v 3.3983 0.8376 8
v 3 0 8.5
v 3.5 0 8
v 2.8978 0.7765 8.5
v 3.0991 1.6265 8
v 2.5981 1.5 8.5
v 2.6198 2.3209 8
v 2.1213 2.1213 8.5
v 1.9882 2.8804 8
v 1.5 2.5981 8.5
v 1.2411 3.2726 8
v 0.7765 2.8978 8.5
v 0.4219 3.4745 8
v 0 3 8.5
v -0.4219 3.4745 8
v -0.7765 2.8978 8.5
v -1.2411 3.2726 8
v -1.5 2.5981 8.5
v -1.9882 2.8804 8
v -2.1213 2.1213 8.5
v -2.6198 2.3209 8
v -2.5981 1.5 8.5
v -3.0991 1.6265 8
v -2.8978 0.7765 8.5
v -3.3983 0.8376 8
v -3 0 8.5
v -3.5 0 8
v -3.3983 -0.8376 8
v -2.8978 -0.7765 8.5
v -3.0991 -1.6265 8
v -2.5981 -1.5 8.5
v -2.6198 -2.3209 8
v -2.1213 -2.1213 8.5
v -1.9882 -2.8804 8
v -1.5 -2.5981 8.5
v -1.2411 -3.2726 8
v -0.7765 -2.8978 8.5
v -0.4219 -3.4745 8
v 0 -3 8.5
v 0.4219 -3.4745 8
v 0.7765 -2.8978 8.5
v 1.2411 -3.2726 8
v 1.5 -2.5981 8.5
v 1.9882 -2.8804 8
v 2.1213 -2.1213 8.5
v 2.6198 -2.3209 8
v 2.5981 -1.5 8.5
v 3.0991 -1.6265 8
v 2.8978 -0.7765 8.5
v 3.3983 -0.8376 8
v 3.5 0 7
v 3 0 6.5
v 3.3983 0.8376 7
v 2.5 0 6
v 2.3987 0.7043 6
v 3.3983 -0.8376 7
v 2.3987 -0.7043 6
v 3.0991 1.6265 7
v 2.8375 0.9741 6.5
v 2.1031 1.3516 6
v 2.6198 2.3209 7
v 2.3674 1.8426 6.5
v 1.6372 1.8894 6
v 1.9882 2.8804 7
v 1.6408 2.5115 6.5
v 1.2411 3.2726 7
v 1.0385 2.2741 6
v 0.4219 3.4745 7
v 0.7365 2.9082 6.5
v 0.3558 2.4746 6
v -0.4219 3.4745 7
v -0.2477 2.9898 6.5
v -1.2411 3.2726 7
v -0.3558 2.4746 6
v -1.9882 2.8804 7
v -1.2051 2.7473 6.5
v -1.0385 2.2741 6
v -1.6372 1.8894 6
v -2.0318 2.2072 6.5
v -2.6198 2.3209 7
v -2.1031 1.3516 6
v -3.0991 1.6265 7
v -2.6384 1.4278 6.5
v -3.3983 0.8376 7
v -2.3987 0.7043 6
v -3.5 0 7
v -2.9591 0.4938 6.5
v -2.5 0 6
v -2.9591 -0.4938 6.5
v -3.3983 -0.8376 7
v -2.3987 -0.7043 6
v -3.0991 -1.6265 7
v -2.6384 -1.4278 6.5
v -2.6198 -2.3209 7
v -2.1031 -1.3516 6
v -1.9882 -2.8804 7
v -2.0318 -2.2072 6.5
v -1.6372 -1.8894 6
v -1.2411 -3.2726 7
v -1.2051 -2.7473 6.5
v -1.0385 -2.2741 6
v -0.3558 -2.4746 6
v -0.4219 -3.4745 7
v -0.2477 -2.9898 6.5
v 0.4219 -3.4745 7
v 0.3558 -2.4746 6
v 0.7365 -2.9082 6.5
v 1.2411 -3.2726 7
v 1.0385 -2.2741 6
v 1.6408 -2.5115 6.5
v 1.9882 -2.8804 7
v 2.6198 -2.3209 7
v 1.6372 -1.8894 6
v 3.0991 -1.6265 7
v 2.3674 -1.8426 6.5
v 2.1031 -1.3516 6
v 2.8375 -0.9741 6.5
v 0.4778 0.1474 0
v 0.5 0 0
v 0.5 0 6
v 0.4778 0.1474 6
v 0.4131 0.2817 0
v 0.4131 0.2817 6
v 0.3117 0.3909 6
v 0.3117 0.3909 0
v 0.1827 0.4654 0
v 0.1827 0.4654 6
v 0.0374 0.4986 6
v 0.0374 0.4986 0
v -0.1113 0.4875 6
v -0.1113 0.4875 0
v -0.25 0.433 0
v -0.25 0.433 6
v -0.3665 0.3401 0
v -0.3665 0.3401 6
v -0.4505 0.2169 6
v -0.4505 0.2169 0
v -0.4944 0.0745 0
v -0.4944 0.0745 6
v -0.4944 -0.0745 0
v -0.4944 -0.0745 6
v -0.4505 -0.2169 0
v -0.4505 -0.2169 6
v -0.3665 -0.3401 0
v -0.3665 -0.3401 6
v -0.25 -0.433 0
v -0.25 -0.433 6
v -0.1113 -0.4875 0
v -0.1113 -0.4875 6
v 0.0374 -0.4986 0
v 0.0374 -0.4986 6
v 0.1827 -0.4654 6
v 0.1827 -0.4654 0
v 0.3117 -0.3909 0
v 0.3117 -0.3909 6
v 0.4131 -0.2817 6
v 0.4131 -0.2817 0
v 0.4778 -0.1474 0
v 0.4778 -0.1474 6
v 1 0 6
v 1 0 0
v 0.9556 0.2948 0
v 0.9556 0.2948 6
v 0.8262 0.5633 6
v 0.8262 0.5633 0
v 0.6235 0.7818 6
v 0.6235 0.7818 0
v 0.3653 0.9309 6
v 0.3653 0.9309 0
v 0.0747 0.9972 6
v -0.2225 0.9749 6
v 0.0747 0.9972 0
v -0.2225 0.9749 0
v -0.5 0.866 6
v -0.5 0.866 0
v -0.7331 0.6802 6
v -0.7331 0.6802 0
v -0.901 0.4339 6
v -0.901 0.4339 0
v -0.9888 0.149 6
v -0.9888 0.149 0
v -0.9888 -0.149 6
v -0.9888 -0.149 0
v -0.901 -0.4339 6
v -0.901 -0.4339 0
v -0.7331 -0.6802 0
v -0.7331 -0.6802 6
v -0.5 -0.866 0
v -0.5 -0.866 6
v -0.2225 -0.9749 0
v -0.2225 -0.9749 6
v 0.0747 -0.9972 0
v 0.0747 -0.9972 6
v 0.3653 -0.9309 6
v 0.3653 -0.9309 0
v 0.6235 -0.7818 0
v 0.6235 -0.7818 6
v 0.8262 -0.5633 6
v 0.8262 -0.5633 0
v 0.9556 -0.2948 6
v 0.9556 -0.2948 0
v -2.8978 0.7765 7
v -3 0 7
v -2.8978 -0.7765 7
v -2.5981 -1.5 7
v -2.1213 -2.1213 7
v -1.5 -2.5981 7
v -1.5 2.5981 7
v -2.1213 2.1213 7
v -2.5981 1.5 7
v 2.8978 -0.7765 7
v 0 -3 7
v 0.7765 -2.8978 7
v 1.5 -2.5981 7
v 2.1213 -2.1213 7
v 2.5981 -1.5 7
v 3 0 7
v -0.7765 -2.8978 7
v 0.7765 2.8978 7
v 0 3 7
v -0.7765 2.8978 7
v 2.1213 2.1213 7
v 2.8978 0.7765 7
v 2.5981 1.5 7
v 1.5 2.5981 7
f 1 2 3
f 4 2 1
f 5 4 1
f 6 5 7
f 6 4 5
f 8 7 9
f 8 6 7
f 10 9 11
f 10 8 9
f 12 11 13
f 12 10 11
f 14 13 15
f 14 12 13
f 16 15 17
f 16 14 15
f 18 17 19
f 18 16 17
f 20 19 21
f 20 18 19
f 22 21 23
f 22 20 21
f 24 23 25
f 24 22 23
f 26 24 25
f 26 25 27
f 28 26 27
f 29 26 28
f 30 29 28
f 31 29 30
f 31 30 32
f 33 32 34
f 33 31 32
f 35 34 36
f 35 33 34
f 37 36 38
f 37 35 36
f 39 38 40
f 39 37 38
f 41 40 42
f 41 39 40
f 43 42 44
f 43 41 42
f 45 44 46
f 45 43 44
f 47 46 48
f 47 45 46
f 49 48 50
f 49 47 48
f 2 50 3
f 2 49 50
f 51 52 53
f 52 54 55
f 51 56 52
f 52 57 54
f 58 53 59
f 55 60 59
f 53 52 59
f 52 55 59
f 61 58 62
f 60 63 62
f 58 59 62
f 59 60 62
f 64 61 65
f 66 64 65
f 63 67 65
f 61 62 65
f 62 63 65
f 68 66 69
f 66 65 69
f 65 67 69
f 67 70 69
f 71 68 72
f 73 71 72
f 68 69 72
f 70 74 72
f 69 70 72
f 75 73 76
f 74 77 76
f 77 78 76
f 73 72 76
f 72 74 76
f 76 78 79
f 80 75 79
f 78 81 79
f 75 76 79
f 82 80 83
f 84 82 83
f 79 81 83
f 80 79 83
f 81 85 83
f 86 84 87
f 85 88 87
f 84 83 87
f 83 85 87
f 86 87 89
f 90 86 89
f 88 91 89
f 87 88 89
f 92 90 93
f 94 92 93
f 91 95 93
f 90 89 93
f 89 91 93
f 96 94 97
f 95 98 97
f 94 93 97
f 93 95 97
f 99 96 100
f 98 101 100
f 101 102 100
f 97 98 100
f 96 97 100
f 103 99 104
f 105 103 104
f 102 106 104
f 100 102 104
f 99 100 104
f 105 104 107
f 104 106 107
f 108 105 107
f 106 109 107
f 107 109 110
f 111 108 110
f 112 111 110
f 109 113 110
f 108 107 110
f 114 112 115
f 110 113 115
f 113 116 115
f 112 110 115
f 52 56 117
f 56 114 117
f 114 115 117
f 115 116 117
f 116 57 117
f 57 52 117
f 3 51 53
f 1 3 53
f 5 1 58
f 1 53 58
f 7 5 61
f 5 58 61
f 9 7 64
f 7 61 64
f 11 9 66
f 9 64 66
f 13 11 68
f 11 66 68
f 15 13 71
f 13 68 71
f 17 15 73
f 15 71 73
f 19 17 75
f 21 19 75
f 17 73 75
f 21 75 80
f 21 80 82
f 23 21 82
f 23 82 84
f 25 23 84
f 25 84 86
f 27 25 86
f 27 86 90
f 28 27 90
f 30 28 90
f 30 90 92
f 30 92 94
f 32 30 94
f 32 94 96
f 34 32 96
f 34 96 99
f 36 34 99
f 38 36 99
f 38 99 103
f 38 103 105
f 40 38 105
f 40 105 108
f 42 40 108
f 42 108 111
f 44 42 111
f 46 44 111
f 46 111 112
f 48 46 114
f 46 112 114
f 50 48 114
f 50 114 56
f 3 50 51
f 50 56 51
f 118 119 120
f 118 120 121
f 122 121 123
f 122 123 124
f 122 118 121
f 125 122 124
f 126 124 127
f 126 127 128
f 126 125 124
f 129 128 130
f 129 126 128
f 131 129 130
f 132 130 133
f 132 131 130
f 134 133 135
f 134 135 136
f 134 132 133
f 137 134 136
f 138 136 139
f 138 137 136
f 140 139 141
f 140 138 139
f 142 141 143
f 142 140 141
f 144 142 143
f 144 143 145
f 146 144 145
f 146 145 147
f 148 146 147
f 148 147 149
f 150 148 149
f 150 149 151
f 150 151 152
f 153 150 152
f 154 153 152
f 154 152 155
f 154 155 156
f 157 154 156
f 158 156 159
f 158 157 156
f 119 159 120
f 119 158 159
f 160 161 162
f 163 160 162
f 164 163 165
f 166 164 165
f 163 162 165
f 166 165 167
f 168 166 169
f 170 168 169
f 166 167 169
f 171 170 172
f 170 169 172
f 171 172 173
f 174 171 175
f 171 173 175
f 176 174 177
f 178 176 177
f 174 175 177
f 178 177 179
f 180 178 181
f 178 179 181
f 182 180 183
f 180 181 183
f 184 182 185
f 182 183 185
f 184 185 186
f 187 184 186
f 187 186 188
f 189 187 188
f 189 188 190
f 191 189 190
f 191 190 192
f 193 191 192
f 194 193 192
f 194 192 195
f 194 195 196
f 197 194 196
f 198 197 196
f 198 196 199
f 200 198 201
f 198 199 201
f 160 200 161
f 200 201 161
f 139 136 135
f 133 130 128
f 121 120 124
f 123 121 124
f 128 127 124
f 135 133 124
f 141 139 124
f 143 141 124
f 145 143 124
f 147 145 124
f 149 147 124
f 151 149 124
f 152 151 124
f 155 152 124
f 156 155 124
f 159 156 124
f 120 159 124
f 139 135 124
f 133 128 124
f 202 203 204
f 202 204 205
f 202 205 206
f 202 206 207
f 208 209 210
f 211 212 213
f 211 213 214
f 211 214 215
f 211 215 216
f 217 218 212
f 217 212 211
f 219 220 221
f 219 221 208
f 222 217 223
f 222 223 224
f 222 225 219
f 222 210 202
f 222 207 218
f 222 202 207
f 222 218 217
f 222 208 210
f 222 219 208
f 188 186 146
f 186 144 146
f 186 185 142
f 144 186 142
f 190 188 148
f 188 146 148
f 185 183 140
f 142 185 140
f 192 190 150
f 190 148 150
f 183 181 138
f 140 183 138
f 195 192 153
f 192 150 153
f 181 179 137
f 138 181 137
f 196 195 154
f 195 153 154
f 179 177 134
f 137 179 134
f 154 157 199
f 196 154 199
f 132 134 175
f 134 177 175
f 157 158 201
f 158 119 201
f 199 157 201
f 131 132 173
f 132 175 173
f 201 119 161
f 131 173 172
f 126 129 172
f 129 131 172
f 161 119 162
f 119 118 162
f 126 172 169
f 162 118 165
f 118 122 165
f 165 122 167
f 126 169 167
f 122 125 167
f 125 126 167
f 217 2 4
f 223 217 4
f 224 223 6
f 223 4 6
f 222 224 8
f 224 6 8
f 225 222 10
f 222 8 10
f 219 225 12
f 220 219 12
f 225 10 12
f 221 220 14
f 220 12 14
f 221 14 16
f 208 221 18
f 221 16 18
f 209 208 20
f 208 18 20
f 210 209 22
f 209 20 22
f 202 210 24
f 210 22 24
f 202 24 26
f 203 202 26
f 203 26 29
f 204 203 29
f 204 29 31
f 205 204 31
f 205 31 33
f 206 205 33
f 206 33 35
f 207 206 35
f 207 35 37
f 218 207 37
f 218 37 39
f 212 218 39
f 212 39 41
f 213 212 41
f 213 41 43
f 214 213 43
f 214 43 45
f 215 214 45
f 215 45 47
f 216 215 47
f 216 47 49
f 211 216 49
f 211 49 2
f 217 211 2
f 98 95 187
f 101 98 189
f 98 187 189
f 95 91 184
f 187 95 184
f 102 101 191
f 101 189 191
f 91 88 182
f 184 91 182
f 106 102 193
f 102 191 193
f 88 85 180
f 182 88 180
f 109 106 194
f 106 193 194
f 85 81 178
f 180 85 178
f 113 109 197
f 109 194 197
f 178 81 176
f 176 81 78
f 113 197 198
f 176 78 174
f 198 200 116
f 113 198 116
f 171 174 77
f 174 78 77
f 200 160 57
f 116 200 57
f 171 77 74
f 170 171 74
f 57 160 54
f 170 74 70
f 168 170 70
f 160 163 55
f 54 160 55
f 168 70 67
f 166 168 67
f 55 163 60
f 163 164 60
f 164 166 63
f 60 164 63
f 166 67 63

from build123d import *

# Parameters (mm, degrees)
ESBO_O1_R                = 1
ESBO_O1_R_2              = 0.5
RESSALTO_EXTRUS_O1_DEPTH = 6
ESBO_O3_R                = 3.5
RESSALTO_EXTRUS_O2_DEPTH = 3
ESBO_O4_R                = 3
CORTE_EXTRUS_O1_DEPTH    = 2
CHANFRO1_SIZE            = 1


with BuildPart() as part:
    # Esboço1 → Ressalto-extrusão1 (new body)
    with BuildSketch(Plane.XY):
        Circle(ESBO_O1_R)
        Circle(ESBO_O1_R_2, mode=Mode.SUBTRACT)
    extrude(amount=RESSALTO_EXTRUS_O1_DEPTH)

    # Esboço3 → Ressalto-extrusão2 (add)
    with BuildSketch(Plane.XY.offset(6)):
        Circle(ESBO_O3_R)
    extrude(amount=RESSALTO_EXTRUS_O2_DEPTH)

    # Esboço4 → Corte-extrusão1 (cut)
    with BuildSketch(Plane.XY.offset(9)):
        Circle(ESBO_O4_R)
    extrude(amount=-CORTE_EXTRUS_O1_DEPTH, mode=Mode.SUBTRACT)

    # Chanfro1
    # the kernel refuses this chamfer: 1 mm, written as the material it takes off along each edge
    with BuildSketch(Plane(origin=(0, 0, 9), x_dir=(1, 0, 0), z_dir=(0, -1, 0))) as chanfro1_piece_1:
        Polygon((3.5, -CHANFRO1_SIZE), (3.5 - CHANFRO1_SIZE, 0), (3.5, 0), align=None)
    revolve(axis=Axis((0, 0, 9), (0, 0, 1)), mode=Mode.SUBTRACT)
    with BuildSketch(Plane(origin=(0, 0, 6), x_dir=(1, 0, 0), z_dir=(0, -1, 0))) as chanfro1_piece_2:
        Polygon((3.5, CHANFRO1_SIZE), (3.5 - CHANFRO1_SIZE, 0), (3.5, 0), align=None)
    revolve(axis=Axis((0, 0, 6), (0, 0, 1)), mode=Mode.SUBTRACT)


solid = part.part
